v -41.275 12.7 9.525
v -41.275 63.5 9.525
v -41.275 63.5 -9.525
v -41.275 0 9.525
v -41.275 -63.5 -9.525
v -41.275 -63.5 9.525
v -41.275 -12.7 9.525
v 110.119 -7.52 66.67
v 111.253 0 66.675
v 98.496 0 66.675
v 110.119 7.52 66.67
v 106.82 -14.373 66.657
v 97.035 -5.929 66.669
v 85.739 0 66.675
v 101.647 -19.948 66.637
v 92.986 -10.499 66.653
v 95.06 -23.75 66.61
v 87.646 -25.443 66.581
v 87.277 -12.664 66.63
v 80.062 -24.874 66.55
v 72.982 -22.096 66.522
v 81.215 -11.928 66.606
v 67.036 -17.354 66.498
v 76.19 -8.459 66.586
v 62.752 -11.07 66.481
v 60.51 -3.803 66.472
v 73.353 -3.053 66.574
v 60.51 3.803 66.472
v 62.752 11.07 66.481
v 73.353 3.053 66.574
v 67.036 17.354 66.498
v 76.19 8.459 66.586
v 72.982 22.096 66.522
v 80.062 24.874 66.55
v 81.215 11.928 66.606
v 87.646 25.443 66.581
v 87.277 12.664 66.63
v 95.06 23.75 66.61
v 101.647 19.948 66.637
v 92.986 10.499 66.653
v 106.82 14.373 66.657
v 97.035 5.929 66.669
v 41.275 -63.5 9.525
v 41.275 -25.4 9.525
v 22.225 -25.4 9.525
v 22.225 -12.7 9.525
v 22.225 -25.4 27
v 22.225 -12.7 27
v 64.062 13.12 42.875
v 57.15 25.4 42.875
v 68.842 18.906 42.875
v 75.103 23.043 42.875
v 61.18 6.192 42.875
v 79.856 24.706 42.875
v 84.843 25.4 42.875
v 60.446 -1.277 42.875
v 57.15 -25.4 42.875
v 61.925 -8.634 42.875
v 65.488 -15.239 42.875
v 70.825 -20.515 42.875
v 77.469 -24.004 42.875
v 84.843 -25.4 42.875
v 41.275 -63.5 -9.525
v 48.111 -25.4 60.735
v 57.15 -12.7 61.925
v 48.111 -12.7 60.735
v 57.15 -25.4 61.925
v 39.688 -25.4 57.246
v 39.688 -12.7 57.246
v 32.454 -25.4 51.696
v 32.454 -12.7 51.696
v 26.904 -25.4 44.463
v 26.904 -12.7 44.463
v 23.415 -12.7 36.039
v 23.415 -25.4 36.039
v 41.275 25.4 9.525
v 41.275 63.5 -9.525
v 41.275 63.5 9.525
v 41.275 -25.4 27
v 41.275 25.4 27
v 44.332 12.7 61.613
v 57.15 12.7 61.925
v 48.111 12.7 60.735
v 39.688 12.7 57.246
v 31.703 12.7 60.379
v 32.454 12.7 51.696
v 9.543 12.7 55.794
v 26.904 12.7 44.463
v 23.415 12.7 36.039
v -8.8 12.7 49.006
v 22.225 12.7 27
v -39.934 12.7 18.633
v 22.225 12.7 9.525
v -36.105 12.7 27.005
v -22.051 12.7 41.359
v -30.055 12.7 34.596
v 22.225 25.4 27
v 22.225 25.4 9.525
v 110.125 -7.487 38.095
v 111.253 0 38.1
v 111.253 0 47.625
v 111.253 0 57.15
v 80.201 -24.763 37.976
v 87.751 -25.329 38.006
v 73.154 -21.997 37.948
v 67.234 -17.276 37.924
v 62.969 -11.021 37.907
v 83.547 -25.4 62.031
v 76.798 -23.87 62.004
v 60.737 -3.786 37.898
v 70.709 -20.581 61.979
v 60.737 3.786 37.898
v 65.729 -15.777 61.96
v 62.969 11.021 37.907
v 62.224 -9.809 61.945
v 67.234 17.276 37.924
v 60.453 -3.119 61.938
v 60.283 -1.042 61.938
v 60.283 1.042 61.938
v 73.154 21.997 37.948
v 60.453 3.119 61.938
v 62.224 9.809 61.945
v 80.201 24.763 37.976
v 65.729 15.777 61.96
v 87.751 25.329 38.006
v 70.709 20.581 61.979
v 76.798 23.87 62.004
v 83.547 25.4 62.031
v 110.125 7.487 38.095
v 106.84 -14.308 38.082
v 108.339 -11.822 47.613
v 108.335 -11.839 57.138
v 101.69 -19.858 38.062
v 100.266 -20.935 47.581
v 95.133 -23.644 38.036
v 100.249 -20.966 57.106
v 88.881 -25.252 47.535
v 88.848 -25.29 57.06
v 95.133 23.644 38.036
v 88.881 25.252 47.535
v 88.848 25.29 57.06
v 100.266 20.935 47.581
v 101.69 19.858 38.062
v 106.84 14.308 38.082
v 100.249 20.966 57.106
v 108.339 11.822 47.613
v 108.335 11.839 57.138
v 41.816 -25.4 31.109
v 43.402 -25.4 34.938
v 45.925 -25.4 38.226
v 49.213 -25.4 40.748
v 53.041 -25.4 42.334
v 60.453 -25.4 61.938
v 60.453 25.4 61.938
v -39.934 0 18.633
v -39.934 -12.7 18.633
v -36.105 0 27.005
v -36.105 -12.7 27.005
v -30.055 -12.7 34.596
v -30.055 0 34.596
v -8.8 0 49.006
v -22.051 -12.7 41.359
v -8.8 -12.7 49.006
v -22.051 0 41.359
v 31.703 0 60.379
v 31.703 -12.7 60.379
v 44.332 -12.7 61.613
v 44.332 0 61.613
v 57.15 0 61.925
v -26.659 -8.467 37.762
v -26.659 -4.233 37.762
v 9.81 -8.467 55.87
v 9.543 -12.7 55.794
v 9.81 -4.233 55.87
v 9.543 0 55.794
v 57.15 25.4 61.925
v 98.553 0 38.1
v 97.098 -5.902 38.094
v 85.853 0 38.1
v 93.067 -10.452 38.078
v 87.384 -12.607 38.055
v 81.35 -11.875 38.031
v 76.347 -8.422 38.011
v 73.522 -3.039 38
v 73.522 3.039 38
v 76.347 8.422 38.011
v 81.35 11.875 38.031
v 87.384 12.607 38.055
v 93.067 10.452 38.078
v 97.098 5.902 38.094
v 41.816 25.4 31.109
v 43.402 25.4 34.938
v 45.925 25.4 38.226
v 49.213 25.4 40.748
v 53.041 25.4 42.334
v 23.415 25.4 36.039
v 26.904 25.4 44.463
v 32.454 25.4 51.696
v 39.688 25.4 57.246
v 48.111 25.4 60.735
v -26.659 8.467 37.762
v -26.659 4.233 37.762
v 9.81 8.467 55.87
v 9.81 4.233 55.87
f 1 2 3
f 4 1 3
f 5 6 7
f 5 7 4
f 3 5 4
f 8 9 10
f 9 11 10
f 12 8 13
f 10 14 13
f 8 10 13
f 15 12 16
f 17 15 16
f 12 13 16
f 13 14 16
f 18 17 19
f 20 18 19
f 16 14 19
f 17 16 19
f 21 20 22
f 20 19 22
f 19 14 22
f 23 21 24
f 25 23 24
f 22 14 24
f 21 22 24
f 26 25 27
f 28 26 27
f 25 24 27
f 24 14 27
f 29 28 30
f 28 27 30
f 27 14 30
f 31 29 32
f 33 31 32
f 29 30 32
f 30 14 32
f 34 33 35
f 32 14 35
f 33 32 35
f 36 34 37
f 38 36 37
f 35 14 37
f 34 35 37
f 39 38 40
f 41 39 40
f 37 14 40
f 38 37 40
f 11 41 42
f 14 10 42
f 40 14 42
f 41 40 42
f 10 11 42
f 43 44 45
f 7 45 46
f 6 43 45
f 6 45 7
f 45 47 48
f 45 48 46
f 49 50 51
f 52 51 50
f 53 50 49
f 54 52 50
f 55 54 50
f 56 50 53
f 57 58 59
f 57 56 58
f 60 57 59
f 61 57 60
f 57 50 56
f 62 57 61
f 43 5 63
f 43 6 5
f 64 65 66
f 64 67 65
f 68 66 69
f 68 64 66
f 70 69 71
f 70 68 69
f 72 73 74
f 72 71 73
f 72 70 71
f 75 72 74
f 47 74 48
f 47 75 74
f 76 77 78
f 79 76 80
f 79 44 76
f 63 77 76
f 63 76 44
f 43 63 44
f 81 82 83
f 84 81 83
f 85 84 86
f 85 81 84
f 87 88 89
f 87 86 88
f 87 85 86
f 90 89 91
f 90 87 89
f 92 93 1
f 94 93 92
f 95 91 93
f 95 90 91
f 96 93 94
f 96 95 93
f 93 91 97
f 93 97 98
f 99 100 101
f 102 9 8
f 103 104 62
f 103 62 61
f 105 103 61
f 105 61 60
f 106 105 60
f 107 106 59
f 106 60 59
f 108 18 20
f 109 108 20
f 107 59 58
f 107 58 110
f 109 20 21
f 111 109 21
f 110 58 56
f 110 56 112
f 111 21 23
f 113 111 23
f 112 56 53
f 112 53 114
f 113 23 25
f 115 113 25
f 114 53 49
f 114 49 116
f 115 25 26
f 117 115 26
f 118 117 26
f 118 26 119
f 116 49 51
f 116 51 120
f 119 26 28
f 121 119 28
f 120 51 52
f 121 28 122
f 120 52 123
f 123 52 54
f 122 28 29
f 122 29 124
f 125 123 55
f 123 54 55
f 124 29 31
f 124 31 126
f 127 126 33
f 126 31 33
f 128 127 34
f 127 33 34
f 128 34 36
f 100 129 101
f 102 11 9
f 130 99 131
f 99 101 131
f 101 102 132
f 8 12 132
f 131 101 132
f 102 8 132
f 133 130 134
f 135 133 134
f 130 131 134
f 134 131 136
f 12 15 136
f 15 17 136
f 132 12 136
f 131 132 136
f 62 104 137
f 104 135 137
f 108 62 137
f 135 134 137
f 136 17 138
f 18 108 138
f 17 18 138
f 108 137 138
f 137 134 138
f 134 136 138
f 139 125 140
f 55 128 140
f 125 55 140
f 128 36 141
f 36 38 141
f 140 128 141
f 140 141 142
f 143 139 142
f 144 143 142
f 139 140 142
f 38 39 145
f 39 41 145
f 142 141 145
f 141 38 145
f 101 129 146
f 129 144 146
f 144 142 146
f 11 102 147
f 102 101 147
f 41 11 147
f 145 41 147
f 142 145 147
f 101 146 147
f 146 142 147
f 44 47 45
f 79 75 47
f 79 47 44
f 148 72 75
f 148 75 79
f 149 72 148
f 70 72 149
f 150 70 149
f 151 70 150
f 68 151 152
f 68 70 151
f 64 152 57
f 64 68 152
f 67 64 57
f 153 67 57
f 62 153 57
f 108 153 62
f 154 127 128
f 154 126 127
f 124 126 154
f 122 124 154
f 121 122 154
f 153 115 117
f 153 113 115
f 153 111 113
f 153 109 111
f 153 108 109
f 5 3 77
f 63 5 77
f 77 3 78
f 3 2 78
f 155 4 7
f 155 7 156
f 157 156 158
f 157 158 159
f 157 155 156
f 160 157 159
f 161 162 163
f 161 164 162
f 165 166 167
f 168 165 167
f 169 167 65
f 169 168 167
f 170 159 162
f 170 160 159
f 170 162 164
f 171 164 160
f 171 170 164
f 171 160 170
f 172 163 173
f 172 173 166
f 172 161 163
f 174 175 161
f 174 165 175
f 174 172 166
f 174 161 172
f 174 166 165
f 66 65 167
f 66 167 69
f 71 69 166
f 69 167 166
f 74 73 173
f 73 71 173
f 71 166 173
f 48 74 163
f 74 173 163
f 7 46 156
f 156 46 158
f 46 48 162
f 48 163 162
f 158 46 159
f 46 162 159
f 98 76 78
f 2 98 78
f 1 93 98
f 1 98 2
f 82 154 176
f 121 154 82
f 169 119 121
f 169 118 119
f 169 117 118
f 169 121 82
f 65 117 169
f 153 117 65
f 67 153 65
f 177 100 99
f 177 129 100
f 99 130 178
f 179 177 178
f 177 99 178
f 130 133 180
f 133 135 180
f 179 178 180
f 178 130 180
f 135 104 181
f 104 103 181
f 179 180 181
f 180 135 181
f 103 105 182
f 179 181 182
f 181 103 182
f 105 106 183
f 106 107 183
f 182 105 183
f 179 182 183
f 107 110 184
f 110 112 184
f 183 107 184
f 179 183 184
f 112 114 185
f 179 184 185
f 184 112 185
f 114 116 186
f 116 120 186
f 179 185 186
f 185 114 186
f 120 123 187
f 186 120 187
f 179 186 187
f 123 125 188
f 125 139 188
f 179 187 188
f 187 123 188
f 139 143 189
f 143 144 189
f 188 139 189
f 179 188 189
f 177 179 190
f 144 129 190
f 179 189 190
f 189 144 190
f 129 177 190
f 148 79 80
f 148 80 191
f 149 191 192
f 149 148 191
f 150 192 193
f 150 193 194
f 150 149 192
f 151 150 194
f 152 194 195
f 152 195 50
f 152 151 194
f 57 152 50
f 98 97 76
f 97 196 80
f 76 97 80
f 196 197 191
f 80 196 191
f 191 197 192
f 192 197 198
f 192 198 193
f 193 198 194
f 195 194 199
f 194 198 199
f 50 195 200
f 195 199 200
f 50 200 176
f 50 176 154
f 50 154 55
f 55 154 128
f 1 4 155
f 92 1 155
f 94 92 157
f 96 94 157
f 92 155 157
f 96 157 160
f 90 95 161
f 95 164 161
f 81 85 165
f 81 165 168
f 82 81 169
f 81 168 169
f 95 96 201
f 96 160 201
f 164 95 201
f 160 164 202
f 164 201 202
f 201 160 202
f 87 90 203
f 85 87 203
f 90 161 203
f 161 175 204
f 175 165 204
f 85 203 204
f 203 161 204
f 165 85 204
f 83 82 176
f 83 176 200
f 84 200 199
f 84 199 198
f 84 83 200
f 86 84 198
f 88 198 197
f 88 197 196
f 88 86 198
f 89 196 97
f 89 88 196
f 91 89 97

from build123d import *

# Parameters (mm, degrees)
F1_DEPTH = 63.5
F2_DEPTH = 25.4
F3_DEPTH = 12.7


with BuildPart() as f1:
    # F0 (on Front) → F1 (new body, symmetric)
    with BuildSketch(Plane.XZ):
        Polygon((-41.275, -9.525), (41.275, -9.525), (41.275, 9.525), (22.225, 9.525), (-41.275, 9.525), align=None)
    extrude(amount=F1_DEPTH, both=True)

    # F0 (on Front) → F2 (join, symmetric)
    with BuildSketch(Plane.XZ):
        with BuildLine():
            Line((22.225, 9.525), (41.275, 9.525))
            Line((41.275, 9.525), (41.275, 27.0002))
            ThreePointArc((41.275, 27.0002), (45.9246798487, 38.2255201513), (57.15, 42.8752))
            Line((57.15, 42.8752), (60.4529731631, 42.8752))
            Line((60.4529731631, 42.8752), (60.4529731631, 61.938414402))
            Line((60.4529731631, 61.938414402), (57.15, 61.9252))
            ThreePointArc((57.15, 61.9252), (32.4542956671, 51.6959043329), (22.225, 27.0002))
            Line((22.225, 27.0002), (22.225, 9.525))
        make_face()
        Polygon((85.7571963739, 62.0396505186), (60.4529731631, 61.938414402), (60.4529731631, 42.8752), (85.8338687354, 42.8752), align=None)
    extrude(amount=F2_DEPTH, both=True)

    # F0 (on Front) → F3 (join, symmetric)
    with BuildSketch(Plane.XZ):
        with BuildLine():
            add(Edge.make_bspline(
                [(-41.275, 9.525), (-41.2464402616, 42.1838574111), (8.0350227654, 62.539242208), (57.15, 61.9252)],
                knots=[0, 0, 0, 0, 111.5045361635, 111.5045361635, 111.5045361635, 111.5045361635], degree=3))
            Line((-41.275, 9.525), (22.225, 9.525))
            Line((22.225, 9.525), (22.225, 27.0002))
            ThreePointArc((22.225, 27.0002), (32.4542956671, 51.6959043329), (57.15, 61.9252))
        make_face()
    extrude(amount=F3_DEPTH, both=True)

    # F0 (on Front) → F4 (revolve)
    with BuildSketch(Plane.XZ):
        Polygon((85.7386514544, 66.675), (85.7571963739, 62.0396505186), (85.8338687354, 42.8752), (85.8529731631, 38.1), (111.2529731631, 38.1), (111.2529731631, 66.675), align=None)
    revolve(axis=Axis((85.7958123088, 0, 52.3875), (0.0040007277, 0, -0.9999919971)))


solid = f1.part
